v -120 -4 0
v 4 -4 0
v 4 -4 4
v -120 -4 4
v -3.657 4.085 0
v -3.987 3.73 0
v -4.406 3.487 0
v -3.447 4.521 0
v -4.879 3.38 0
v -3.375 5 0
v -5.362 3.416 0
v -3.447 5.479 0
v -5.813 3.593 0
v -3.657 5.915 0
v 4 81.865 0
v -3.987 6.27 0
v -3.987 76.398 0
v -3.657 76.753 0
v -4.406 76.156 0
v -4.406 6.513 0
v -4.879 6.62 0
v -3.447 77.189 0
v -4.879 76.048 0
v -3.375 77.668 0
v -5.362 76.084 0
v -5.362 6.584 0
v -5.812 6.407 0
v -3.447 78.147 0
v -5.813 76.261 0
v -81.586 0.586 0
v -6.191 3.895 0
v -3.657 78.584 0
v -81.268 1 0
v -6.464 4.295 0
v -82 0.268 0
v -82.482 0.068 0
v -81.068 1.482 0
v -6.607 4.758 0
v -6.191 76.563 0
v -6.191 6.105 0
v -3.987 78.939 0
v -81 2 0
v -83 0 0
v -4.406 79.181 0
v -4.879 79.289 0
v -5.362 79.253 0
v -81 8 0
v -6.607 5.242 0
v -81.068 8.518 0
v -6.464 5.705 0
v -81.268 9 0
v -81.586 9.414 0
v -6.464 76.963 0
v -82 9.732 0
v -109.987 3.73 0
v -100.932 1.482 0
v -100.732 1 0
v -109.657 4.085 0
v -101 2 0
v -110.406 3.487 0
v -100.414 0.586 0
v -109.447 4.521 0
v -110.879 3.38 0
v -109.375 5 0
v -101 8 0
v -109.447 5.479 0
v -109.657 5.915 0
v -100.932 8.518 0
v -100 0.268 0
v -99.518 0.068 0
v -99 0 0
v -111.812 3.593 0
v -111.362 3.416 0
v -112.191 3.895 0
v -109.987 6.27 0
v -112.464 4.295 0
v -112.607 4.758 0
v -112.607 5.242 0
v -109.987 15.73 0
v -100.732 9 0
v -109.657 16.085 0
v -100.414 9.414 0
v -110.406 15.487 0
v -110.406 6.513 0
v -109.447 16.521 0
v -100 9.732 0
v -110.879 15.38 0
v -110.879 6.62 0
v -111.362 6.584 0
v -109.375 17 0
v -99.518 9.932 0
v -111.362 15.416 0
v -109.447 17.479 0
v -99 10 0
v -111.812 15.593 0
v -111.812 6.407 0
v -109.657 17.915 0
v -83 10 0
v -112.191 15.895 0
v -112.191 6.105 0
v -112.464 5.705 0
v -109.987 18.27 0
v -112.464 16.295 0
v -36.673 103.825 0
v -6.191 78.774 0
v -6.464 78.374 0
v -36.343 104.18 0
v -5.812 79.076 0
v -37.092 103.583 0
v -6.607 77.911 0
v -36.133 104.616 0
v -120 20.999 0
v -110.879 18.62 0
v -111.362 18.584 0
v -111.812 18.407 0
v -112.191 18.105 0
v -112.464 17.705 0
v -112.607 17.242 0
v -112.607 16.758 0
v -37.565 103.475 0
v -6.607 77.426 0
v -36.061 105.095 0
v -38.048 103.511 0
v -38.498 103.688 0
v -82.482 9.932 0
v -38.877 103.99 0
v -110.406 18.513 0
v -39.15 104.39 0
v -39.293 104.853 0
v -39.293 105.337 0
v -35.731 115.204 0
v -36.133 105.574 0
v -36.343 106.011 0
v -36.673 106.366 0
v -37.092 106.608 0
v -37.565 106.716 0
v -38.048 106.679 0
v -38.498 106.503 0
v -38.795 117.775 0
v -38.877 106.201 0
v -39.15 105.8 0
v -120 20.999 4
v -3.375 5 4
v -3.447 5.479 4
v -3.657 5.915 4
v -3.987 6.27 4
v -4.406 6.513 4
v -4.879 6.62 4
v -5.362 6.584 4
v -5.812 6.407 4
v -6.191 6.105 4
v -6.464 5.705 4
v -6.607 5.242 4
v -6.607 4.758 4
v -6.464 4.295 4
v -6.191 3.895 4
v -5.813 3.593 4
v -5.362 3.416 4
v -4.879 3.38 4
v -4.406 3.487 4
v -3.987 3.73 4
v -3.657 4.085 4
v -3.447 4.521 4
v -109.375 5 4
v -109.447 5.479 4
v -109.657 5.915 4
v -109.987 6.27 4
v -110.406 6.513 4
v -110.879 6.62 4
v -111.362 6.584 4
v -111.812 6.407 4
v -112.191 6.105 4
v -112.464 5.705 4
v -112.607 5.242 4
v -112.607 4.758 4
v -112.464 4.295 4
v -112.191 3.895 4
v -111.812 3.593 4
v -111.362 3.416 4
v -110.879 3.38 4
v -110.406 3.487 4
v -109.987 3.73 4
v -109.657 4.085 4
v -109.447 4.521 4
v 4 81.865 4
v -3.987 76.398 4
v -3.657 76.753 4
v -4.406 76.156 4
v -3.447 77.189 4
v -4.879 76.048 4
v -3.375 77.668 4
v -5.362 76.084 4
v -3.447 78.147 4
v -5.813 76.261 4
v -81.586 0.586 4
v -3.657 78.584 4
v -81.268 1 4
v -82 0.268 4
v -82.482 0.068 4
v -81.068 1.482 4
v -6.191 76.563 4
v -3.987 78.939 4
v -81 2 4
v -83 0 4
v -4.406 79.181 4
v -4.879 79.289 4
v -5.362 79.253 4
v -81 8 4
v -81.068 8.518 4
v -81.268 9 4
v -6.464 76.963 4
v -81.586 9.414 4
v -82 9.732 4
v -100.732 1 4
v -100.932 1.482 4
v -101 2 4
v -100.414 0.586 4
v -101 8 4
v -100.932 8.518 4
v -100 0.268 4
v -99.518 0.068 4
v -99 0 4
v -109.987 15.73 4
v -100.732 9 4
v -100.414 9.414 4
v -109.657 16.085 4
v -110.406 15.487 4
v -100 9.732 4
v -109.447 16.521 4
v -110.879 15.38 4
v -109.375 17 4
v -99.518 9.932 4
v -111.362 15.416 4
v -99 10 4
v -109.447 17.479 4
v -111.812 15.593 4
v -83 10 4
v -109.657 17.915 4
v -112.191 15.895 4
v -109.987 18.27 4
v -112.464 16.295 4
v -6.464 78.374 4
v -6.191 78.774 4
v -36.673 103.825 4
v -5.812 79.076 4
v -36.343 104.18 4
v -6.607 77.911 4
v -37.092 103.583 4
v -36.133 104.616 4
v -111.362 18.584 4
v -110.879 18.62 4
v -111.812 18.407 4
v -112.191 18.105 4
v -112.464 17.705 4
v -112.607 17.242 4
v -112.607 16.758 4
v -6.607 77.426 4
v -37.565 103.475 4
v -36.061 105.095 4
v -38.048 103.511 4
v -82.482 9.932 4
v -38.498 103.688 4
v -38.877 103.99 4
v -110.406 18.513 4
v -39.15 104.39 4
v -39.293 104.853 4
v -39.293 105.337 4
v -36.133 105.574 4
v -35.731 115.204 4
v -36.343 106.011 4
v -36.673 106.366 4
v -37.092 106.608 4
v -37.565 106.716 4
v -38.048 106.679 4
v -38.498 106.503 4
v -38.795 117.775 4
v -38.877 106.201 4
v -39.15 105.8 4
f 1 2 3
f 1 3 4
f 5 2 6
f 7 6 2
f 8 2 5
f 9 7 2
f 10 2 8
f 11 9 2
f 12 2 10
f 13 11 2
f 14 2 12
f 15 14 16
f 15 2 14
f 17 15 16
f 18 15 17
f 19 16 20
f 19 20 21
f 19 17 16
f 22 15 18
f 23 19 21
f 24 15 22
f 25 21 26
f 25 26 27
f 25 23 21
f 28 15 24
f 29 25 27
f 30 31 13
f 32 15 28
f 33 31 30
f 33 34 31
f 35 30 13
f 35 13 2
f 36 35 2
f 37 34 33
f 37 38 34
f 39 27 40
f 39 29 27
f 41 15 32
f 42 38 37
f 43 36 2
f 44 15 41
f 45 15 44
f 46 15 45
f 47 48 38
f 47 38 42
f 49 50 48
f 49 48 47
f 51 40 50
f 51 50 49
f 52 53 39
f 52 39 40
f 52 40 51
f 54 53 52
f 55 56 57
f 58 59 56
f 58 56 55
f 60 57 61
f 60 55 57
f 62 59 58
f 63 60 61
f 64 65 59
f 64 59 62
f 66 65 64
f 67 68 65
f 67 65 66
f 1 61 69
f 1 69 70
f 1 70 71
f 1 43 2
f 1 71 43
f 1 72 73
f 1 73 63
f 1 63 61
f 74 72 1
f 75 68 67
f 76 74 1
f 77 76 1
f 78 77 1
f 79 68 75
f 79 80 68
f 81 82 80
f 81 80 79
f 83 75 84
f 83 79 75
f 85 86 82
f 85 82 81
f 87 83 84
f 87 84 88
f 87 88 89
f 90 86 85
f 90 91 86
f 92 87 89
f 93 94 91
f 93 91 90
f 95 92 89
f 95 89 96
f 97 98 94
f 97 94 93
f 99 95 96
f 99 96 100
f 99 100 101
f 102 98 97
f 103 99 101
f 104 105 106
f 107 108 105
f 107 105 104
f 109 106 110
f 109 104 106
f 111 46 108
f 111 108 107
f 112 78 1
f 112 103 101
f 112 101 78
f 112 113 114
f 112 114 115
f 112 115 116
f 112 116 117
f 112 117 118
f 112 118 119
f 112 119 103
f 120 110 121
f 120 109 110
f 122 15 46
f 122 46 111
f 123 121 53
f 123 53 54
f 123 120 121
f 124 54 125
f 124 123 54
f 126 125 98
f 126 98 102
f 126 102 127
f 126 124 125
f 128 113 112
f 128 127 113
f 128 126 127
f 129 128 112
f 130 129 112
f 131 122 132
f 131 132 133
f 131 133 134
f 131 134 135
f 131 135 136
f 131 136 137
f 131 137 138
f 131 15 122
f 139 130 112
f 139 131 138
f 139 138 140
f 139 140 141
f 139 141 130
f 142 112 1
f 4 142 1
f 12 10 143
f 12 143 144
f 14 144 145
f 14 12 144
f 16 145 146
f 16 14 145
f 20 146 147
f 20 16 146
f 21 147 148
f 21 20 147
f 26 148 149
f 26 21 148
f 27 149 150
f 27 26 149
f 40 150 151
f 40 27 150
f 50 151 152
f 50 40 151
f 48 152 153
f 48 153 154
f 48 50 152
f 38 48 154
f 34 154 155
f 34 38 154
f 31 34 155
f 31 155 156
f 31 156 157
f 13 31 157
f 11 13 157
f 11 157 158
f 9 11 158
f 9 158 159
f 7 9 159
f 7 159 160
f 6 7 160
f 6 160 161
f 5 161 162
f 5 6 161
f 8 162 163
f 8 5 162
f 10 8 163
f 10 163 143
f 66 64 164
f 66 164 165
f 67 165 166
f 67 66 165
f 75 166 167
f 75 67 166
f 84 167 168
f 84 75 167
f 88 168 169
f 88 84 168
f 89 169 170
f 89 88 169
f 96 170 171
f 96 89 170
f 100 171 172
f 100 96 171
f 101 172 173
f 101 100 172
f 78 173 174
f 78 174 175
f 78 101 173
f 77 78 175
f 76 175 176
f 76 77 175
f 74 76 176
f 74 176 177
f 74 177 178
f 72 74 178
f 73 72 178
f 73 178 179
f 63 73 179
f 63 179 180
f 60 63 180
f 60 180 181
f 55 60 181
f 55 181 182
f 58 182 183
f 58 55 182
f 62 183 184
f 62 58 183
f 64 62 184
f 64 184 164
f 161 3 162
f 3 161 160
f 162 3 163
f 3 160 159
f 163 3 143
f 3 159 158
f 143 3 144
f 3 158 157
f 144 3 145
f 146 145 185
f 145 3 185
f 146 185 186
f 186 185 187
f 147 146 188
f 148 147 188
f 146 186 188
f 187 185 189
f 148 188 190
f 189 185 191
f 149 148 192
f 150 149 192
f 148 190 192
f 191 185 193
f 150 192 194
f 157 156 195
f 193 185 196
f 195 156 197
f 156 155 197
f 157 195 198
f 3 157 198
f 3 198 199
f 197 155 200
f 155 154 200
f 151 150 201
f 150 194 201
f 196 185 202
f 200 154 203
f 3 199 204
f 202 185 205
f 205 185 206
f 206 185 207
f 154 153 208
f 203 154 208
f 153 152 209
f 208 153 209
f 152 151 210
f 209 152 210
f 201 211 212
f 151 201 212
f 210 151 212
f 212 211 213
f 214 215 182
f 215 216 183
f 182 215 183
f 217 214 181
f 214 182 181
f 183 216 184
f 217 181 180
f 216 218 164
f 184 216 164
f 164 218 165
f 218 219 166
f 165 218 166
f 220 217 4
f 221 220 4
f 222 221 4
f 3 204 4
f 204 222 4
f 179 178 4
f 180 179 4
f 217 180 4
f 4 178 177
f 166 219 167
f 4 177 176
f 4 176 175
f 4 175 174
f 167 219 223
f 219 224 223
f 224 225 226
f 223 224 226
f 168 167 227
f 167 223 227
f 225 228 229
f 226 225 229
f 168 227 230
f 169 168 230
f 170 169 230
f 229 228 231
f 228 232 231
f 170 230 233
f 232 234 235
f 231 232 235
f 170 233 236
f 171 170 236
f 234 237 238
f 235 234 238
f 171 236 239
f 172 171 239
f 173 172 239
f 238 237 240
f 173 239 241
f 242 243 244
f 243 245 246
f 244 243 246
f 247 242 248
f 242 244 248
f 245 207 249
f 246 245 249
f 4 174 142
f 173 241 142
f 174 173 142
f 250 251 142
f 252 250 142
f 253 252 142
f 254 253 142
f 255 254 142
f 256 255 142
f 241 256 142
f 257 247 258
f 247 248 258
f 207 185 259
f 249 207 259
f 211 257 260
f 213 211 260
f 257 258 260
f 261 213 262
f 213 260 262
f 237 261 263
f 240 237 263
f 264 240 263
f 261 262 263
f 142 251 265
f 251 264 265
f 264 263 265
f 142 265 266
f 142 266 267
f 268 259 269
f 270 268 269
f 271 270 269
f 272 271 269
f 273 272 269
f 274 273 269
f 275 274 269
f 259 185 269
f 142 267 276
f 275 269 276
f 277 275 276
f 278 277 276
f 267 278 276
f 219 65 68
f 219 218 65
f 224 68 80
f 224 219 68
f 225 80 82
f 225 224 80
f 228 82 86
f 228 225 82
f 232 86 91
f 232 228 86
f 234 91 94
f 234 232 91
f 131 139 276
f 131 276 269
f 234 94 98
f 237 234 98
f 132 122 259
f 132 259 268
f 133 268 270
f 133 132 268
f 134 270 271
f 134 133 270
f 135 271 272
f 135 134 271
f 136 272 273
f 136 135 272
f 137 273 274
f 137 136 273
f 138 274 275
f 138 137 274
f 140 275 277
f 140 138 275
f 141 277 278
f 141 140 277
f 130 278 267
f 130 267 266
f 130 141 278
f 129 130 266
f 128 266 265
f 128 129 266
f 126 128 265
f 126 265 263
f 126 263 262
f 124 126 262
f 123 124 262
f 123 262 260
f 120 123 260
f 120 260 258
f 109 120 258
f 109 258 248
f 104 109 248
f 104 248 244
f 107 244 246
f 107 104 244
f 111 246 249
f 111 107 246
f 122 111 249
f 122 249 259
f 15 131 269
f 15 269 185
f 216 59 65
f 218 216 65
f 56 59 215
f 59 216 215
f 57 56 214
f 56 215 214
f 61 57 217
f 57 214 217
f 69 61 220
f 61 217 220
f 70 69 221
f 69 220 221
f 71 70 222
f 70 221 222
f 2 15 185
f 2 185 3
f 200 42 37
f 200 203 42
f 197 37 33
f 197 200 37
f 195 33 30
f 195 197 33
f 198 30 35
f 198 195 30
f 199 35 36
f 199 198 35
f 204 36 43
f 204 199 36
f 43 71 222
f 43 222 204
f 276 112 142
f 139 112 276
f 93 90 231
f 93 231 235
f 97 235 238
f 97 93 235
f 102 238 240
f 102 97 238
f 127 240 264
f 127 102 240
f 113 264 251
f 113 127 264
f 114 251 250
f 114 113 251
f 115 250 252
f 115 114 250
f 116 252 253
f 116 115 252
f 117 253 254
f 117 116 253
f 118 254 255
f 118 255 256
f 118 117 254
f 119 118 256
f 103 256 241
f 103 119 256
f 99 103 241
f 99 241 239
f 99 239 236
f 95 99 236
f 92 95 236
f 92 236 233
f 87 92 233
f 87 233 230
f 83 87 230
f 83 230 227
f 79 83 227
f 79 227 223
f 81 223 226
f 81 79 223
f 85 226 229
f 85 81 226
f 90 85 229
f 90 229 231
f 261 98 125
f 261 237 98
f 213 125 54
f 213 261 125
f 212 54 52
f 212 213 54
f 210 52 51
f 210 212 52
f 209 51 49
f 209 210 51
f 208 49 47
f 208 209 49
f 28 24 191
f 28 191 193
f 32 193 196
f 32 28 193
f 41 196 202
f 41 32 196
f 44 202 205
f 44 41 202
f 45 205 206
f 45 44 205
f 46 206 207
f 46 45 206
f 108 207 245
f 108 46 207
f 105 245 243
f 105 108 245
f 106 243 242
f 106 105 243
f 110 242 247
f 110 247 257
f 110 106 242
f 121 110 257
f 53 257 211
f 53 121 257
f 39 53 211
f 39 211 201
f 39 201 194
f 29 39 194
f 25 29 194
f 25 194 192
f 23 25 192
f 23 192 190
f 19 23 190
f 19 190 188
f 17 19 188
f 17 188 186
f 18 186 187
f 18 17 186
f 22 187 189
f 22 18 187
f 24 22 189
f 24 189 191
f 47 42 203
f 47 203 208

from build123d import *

# Parameters (mm, degrees)
SKETCH1_R           = 1.625
SKETCH1_W           = 20
SKETCH1_H           = 10
BOSS_EXTRUDE1_DEPTH = 4
FILLET1_R           = 2


with BuildPart() as part:
    # Sketch1 → Boss-Extrude1 (new body)
    with BuildSketch(Plane.XY):
        Polygon((-35.731071717, 115.203558257), (4, 81.865230633), (4, -4), (-120, -4), (-120, 0), (-120, 20.998655539), (-38.79524949, 117.774708696), align=None)
        with Locations((-5, 5)):
            Circle(SKETCH1_R, mode=Mode.SUBTRACT)
        with Locations((-111, 5)):
            Circle(SKETCH1_R, mode=Mode.SUBTRACT)
        with Locations((-111, 17)):
            Circle(SKETCH1_R, mode=Mode.SUBTRACT)
        with Locations((-37.685937989, 105.09522022)):
            Circle(SKETCH1_R, mode=Mode.SUBTRACT)
        with Locations((-5, 77.668461709)):
            Circle(SKETCH1_R, mode=Mode.SUBTRACT)
        with Locations((-91, 5)):
            Rectangle(SKETCH1_W, SKETCH1_H, mode=Mode.SUBTRACT)
    extrude(amount=BOSS_EXTRUDE1_DEPTH)

    # Fillet1
    fillet1_edges = [part.edges().sort_by_distance(p)[0] for p in [
        (-101, 10, 2),
        (-101, 0, 2),
        (-81, 0, 2),
        (-81, 10, 2),
    ]]
    fillet(fillet1_edges, radius=FILLET1_R)


solid = part.part
